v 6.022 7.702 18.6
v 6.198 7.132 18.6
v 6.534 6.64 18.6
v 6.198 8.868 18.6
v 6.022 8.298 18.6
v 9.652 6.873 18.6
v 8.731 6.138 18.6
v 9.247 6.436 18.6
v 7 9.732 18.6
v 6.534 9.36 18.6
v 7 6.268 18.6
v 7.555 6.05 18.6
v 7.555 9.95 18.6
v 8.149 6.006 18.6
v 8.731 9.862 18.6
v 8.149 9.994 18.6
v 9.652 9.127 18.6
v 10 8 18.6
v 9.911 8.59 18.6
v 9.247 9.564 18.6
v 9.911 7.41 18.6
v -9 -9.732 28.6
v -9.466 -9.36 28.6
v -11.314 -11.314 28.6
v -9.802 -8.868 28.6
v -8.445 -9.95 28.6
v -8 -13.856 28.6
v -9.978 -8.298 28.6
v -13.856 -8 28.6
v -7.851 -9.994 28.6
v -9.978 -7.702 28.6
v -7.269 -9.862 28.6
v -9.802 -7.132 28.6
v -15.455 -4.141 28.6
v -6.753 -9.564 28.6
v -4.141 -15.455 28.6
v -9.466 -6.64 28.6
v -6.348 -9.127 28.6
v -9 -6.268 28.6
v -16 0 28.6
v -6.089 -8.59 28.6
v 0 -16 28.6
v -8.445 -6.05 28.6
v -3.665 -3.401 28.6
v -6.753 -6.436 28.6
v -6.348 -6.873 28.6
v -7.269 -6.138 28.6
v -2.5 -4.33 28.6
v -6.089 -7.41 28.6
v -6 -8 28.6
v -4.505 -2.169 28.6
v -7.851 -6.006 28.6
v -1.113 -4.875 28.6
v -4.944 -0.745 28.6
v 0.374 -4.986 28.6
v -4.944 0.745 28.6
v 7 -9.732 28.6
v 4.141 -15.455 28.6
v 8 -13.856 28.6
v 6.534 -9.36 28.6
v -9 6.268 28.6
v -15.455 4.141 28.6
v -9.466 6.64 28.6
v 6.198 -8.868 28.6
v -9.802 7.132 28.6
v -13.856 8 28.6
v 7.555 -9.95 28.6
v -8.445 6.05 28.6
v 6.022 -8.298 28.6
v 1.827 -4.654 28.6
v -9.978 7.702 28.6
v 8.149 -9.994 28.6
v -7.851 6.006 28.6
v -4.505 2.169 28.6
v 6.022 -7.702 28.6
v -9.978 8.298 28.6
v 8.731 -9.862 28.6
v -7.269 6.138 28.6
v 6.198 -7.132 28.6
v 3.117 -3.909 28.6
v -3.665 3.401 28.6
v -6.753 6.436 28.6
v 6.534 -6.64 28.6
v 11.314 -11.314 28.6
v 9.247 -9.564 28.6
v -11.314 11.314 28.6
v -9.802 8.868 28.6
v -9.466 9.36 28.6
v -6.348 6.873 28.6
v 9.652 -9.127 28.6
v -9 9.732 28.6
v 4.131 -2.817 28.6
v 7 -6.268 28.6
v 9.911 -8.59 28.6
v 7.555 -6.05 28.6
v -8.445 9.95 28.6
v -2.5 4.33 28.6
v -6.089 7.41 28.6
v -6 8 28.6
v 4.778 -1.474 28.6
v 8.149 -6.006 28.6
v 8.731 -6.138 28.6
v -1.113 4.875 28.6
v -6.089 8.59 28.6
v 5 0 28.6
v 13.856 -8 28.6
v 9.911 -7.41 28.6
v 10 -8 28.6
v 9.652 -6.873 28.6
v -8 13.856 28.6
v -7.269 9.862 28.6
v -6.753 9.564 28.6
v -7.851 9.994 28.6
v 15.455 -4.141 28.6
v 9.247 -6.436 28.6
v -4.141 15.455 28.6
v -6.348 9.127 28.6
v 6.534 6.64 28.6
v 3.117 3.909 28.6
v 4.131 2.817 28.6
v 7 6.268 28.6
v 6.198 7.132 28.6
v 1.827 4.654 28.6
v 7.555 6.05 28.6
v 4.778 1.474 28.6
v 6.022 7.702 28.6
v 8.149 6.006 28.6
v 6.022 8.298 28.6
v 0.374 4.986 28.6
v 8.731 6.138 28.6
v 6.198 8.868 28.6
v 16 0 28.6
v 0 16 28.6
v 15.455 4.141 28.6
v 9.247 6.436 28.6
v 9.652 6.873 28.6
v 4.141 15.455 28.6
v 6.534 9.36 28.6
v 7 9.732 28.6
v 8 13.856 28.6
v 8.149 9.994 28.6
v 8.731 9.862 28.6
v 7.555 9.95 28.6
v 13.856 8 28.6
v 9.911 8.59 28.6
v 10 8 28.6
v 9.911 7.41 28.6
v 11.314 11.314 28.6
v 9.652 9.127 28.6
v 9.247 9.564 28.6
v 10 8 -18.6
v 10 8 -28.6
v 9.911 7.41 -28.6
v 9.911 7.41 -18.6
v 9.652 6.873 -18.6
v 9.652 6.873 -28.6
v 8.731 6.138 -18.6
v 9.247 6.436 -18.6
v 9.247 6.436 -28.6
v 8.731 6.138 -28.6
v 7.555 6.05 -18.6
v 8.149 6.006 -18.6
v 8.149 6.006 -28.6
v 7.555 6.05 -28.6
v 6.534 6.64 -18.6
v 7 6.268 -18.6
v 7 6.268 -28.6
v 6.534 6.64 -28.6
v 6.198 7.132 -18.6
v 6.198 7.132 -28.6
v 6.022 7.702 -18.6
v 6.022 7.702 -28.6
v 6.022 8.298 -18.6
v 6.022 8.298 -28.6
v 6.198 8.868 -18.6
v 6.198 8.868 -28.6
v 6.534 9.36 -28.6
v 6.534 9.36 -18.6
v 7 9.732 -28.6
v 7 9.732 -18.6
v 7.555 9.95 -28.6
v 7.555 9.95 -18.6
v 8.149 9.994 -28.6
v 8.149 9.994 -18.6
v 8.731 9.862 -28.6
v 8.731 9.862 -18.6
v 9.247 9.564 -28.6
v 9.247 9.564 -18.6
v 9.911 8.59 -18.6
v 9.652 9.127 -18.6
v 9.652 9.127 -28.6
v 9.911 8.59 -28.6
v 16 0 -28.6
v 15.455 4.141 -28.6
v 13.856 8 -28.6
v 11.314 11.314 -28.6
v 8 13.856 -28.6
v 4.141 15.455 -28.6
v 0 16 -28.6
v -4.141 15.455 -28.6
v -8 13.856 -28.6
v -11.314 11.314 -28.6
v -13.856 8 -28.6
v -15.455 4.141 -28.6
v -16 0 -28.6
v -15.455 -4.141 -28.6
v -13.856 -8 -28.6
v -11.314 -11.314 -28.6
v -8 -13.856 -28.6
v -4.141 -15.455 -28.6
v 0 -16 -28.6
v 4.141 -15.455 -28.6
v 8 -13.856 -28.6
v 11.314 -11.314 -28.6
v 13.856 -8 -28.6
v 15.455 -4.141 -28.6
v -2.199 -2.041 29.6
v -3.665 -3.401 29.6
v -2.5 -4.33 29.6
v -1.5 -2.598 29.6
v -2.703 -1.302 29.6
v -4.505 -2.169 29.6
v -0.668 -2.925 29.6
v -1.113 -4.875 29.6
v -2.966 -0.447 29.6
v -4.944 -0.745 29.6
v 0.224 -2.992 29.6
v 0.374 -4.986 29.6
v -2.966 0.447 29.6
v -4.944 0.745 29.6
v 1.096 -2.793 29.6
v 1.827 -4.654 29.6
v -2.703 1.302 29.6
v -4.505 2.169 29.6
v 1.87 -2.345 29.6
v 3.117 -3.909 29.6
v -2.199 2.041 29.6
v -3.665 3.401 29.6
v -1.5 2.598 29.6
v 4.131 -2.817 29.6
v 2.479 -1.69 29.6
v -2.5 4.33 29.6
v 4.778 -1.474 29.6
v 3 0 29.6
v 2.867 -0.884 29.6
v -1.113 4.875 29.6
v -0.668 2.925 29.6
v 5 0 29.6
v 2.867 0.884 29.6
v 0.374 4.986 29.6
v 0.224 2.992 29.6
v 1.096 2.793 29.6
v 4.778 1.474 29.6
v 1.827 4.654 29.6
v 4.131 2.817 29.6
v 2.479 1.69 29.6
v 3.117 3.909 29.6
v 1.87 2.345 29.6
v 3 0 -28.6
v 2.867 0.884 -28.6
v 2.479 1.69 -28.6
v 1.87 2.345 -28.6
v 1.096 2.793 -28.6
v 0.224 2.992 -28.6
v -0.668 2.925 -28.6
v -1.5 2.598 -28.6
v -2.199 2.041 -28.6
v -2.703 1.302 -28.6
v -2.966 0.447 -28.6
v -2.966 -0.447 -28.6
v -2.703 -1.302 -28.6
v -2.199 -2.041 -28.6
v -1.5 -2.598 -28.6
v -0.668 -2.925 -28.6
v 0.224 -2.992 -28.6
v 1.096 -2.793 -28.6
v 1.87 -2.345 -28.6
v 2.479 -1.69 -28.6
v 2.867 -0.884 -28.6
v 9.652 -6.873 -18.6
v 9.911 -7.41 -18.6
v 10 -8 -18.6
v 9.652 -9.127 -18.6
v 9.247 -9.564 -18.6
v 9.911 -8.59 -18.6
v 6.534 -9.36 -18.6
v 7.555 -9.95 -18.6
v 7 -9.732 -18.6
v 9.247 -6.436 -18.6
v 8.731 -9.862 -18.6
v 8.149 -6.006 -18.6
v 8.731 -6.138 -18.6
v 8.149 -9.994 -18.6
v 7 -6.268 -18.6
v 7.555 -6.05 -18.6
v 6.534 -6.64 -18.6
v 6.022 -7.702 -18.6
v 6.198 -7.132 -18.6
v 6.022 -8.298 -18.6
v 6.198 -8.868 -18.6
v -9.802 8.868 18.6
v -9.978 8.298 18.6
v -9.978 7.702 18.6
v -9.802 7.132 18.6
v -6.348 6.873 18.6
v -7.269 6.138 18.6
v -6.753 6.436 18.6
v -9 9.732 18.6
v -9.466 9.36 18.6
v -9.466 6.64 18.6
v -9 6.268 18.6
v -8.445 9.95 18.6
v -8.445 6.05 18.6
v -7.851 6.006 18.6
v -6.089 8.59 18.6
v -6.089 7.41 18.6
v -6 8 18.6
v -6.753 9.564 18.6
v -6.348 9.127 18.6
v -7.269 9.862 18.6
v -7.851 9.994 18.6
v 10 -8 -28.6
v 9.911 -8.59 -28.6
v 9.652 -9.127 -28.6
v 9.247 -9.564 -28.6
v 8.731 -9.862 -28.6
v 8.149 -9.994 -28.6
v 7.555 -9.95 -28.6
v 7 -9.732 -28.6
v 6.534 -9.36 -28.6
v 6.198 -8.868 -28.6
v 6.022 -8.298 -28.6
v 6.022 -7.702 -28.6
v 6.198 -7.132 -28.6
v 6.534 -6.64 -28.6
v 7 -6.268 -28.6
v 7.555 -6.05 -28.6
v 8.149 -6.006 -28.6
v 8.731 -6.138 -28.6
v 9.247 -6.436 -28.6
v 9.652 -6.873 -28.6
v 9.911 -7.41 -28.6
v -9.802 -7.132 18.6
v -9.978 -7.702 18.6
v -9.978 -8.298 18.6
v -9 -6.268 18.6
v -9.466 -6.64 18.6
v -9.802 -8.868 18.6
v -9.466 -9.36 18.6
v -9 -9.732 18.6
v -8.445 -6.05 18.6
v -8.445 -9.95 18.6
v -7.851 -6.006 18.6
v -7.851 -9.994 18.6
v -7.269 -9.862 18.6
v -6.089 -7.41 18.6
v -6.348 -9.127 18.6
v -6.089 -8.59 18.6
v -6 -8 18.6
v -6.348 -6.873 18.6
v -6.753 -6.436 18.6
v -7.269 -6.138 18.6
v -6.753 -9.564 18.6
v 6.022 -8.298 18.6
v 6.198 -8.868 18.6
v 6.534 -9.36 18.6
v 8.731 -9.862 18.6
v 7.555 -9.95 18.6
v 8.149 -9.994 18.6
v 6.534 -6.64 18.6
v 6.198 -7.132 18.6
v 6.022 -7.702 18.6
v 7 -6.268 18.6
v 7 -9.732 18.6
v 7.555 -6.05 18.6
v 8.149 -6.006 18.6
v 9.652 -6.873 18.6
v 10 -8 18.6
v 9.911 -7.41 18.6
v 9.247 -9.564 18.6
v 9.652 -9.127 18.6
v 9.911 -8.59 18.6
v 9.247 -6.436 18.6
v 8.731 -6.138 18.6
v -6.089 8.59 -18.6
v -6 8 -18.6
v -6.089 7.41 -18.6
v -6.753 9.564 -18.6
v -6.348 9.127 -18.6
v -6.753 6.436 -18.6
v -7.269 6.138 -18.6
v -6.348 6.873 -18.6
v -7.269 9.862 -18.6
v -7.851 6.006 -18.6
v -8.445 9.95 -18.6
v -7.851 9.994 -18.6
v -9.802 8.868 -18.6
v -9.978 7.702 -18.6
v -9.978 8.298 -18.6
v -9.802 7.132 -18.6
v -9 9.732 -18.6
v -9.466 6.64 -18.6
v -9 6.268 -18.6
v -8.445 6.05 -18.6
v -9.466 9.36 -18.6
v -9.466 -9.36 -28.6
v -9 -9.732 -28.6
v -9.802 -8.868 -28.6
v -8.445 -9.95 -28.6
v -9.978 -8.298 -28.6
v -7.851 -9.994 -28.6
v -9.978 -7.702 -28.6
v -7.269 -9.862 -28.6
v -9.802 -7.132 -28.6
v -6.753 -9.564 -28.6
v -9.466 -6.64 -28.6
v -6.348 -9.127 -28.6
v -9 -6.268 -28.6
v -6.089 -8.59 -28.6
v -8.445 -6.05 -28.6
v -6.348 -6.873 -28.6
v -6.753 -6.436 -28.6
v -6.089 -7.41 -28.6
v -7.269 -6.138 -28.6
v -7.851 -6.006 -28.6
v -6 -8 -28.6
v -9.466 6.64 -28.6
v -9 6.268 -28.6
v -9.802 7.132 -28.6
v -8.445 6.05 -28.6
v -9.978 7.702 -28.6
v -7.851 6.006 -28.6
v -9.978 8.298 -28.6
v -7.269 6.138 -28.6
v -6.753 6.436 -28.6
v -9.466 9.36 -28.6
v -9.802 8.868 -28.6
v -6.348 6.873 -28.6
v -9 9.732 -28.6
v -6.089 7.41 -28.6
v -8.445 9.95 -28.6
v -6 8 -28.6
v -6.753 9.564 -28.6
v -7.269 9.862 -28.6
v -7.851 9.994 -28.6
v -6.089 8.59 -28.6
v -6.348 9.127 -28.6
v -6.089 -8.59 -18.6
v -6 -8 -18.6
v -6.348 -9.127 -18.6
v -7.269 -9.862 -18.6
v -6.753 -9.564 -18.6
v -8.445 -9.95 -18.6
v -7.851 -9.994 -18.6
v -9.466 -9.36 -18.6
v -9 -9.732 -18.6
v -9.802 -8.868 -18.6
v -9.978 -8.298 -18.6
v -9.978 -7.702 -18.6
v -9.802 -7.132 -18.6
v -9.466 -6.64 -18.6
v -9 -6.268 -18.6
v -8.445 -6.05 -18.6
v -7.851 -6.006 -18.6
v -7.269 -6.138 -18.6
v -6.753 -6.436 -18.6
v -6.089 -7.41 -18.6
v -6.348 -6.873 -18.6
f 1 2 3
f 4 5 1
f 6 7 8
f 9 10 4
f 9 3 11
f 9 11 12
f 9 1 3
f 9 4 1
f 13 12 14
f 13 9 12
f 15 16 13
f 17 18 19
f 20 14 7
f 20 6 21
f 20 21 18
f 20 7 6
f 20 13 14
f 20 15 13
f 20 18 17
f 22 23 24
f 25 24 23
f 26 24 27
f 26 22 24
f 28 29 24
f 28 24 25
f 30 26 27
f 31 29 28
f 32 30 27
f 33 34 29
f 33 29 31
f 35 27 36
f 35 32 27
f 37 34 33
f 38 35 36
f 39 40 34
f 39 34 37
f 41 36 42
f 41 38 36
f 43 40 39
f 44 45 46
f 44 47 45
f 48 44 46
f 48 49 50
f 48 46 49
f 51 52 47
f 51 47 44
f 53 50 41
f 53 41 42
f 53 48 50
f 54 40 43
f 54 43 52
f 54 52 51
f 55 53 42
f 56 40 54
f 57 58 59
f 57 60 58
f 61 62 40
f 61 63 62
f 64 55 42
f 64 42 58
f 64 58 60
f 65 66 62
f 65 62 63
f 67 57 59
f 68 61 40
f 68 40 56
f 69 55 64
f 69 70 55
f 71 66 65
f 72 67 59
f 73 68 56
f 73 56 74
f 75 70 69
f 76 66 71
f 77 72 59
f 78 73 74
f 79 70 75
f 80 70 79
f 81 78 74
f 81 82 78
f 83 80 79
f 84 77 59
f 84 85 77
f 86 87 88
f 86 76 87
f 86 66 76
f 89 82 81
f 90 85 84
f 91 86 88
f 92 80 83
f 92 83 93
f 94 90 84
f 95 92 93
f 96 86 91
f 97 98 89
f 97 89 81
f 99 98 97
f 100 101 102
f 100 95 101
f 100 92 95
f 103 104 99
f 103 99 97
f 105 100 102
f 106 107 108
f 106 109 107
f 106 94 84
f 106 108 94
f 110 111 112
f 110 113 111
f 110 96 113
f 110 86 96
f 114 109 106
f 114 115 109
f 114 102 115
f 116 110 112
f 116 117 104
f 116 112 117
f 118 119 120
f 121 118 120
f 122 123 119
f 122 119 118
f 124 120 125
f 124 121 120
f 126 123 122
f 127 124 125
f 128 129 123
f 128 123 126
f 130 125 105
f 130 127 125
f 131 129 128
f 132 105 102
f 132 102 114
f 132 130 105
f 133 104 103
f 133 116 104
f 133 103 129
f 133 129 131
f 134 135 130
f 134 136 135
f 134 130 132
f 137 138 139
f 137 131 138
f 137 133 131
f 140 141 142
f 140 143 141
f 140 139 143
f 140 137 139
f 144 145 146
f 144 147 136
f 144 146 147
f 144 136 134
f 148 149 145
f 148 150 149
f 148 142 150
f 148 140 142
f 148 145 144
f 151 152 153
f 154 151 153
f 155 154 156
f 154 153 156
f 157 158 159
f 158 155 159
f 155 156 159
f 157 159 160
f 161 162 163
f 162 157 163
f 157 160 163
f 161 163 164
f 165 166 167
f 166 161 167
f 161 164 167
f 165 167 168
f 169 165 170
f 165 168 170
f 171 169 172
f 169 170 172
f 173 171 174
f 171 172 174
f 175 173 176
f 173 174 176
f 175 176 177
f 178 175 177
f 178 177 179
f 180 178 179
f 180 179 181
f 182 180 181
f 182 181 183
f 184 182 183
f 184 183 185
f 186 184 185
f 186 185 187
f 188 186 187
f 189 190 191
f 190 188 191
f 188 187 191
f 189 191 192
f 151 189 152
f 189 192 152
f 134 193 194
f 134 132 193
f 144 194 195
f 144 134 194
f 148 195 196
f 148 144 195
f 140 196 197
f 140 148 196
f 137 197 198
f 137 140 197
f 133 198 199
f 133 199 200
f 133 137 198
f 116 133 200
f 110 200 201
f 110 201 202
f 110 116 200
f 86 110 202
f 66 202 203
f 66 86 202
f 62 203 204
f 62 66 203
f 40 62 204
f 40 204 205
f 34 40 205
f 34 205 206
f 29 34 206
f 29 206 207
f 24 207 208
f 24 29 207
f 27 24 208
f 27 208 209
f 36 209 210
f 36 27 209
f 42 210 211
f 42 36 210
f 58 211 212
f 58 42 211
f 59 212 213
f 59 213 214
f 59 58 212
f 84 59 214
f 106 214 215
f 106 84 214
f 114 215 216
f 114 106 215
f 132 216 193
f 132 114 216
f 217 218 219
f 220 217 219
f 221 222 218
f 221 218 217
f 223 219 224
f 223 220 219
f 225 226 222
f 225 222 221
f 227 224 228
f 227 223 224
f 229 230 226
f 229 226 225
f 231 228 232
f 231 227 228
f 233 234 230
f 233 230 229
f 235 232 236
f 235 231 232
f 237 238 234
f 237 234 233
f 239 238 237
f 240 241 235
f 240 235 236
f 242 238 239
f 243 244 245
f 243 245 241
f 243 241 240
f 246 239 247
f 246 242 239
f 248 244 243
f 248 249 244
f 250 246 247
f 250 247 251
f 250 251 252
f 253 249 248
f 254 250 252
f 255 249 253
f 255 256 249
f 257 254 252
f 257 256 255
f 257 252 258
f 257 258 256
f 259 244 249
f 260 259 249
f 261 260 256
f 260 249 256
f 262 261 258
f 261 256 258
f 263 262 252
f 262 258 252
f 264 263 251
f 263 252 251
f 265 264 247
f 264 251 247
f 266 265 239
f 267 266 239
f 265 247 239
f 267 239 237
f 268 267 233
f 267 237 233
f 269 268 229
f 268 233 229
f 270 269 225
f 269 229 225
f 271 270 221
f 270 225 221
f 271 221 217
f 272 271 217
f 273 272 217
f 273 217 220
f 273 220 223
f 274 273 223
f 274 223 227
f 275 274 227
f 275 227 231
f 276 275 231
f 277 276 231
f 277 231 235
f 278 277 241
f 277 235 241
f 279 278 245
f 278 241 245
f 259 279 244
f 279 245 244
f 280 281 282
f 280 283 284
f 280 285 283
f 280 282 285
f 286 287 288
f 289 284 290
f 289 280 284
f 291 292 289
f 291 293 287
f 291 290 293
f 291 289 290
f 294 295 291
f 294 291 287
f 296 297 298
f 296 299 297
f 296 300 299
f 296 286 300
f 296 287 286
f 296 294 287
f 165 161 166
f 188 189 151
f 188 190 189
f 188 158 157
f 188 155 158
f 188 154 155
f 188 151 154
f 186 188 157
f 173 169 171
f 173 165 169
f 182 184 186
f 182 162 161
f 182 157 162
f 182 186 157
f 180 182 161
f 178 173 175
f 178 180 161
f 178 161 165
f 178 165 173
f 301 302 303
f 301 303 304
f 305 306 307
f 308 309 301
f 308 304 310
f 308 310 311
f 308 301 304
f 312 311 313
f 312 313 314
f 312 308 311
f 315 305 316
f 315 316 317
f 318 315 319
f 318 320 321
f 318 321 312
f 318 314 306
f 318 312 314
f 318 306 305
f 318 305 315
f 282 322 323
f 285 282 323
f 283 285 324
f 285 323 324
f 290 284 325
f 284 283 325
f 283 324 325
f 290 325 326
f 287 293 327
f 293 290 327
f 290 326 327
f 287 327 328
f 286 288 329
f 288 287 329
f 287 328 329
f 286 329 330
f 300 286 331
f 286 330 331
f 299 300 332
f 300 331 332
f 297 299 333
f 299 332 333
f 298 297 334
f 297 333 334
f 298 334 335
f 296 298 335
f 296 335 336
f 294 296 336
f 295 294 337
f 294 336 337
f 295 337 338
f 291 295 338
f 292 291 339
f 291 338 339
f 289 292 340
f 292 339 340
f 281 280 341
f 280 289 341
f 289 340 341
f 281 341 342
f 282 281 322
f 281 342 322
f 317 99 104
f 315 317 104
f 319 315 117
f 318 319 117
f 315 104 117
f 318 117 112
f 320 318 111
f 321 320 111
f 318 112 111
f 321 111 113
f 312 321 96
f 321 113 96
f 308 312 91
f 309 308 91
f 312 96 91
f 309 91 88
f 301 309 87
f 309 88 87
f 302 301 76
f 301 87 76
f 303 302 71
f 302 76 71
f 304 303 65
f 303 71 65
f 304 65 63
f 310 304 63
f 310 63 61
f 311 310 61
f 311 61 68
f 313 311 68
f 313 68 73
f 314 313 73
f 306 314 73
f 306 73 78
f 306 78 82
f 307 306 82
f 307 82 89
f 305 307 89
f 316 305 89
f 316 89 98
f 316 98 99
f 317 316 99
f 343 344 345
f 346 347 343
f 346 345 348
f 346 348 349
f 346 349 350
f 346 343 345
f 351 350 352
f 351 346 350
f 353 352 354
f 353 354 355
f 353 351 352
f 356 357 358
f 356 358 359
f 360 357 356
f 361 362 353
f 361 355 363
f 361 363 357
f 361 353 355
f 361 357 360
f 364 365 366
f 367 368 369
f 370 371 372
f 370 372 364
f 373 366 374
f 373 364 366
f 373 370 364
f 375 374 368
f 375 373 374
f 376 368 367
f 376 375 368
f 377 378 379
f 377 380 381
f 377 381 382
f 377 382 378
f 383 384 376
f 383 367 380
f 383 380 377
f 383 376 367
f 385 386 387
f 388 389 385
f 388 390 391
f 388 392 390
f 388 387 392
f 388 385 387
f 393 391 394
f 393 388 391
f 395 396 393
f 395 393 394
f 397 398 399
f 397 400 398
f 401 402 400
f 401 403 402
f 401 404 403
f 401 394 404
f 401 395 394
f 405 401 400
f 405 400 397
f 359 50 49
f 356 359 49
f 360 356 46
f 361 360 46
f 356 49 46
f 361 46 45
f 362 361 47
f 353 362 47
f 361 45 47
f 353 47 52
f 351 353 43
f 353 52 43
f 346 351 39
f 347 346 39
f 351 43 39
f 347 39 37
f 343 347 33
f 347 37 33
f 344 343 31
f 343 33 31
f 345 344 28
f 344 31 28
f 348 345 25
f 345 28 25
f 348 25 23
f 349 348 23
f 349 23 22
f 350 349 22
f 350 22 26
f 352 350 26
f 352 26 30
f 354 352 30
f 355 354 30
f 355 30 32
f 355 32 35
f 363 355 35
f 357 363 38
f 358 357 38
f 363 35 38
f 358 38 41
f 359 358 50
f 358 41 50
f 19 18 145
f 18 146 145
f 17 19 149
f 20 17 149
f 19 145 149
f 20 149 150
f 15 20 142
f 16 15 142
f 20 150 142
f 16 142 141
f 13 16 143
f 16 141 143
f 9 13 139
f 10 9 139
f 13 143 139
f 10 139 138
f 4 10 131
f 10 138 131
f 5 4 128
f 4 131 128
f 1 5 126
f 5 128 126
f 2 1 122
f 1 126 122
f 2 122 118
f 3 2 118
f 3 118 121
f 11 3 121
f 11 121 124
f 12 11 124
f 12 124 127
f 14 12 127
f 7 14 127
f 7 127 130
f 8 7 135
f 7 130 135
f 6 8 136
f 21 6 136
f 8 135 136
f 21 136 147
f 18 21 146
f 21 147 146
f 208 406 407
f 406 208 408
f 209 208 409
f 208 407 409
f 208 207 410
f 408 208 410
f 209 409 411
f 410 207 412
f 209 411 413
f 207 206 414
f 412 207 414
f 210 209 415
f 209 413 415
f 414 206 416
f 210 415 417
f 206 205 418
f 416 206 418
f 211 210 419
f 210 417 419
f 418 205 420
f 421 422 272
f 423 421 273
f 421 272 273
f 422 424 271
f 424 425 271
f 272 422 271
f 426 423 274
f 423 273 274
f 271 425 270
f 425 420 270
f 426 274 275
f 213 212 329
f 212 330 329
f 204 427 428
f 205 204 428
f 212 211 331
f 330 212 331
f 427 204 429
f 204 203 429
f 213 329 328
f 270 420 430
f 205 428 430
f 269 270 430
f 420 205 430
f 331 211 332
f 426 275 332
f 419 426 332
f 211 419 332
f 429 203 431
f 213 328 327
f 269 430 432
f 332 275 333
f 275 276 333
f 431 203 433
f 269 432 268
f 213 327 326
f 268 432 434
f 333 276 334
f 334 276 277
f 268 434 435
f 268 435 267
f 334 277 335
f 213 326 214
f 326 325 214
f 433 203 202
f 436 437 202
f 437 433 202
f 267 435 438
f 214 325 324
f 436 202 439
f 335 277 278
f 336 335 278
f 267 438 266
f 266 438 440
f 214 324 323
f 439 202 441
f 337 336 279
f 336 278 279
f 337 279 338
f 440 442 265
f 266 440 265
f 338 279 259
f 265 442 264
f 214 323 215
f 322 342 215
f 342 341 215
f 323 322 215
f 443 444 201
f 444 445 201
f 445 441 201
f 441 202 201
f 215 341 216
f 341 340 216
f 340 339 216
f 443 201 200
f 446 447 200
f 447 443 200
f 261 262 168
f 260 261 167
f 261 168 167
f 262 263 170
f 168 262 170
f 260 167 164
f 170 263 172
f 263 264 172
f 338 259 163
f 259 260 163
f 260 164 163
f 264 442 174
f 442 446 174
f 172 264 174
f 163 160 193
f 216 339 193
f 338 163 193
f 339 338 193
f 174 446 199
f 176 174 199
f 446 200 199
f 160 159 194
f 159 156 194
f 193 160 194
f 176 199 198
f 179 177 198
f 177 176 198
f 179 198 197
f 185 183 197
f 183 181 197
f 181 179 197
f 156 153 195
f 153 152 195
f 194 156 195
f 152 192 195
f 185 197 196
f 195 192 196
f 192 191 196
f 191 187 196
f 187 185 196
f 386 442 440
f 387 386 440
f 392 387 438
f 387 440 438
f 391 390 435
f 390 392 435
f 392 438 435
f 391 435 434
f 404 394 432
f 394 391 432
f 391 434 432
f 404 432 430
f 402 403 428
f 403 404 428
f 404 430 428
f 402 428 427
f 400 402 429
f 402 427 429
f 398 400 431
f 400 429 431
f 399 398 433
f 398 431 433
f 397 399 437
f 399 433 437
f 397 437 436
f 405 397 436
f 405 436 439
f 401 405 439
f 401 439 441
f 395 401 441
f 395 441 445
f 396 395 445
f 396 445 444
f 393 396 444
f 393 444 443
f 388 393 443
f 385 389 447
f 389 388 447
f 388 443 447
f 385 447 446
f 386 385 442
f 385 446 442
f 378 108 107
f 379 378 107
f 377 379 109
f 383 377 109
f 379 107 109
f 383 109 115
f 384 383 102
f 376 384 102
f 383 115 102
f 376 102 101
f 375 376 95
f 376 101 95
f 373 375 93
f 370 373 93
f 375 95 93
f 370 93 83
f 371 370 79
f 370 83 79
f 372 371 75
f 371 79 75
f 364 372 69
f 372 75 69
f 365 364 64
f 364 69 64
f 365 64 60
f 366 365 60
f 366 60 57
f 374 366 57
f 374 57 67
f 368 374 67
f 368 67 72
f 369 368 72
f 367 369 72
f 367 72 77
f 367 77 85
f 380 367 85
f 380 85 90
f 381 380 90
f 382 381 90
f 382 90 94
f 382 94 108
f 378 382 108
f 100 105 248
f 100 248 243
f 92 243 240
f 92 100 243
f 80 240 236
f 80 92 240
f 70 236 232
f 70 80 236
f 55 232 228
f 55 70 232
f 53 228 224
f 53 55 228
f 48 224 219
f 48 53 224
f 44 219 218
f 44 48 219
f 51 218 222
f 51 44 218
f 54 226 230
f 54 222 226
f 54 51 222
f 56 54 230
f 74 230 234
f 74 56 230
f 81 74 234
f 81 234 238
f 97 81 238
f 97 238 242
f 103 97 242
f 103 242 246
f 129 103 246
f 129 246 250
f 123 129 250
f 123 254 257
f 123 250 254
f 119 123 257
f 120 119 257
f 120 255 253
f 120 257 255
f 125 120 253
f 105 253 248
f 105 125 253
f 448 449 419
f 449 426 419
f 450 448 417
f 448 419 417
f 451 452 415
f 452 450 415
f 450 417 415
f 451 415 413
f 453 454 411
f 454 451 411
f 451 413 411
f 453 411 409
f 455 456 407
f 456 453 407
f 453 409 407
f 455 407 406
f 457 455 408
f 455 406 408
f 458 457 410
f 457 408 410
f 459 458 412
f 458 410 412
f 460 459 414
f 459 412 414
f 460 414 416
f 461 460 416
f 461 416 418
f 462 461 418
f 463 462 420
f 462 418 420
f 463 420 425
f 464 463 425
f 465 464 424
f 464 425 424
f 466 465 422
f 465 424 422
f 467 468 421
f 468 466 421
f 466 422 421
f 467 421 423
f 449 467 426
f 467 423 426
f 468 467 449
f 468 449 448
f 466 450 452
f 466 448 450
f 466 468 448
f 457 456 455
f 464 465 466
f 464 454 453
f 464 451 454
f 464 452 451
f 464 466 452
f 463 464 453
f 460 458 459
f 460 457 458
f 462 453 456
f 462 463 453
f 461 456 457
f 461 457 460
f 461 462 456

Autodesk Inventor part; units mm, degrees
ref_plane "YZ Plane" through (0, 0, 0) normal (1, 0, 0) x (0, 1, 0)
ref_plane "XZ Plane" through (0, 0, 0) normal (0, 1, 0) x (-1, 0, 0)
ref_plane "XY Plane" through (0, 0, 0) normal (0, 0, 1) x (1, 0, 0)
sketch "Skizze1" plane through (0, 0, 0) normal (0, 0, 1) x (1, 0, 0)
  circle A0 centre (0, 0) radius 16
  circle A1 centre (-8, 8) radius 2
  line L0 (0, 16) -> (0, -16) construction
  line L1 (-16, 0) -> (16, 0) construction
  circle A2 centre (8, 8) radius 2
  circle A3 centre (-8, -8) radius 2
  circle A4 centre (8, -8) radius 2
  circle A5 centre (0, 0) radius 5
  circle A6 centre (0, 0) radius 3
  dimension "d0" = 32
  dimension "d1" = 4
  dimension "d2" = 8
  dimension "d3" = 8
  dimension "d6" = 16
  dimension "d9" = 16
  dimension "d16" = 10
  dimension "d19" = 6
extrude "Extrusion1" add sketch "Skizze1" along normal mid plane 57.2 contours A0 | A1 | A2 | A3 | A4 | A5 | A6
extrude "Extrusion2" cut sketch "Skizze1" against normal blind 10 from surface at 28.6 contours A1 | A2 | A3 | A4
extrude "Extrusion3" add sketch "Skizze1" along normal blind 1 from surface at 28.6 contours A5 | A6
extrude "Extrusion4" cut sketch "Skizze1" along normal through all both and the other way through all contours A6
mirror "Spiegeln1" about plane through (0, 0, 0) normal (0, 0, 1) of "Extrusion2"
equation "\"d2\" = Montage"
equation "\"d3\" = Montage"
equation "\"d6\" = 2 * Montage"
equation "\"d9\" = 2 * Montage"
equation "\"Montage\" = 8"
properties part number "Generator" material "ABS-Kunststoff"
